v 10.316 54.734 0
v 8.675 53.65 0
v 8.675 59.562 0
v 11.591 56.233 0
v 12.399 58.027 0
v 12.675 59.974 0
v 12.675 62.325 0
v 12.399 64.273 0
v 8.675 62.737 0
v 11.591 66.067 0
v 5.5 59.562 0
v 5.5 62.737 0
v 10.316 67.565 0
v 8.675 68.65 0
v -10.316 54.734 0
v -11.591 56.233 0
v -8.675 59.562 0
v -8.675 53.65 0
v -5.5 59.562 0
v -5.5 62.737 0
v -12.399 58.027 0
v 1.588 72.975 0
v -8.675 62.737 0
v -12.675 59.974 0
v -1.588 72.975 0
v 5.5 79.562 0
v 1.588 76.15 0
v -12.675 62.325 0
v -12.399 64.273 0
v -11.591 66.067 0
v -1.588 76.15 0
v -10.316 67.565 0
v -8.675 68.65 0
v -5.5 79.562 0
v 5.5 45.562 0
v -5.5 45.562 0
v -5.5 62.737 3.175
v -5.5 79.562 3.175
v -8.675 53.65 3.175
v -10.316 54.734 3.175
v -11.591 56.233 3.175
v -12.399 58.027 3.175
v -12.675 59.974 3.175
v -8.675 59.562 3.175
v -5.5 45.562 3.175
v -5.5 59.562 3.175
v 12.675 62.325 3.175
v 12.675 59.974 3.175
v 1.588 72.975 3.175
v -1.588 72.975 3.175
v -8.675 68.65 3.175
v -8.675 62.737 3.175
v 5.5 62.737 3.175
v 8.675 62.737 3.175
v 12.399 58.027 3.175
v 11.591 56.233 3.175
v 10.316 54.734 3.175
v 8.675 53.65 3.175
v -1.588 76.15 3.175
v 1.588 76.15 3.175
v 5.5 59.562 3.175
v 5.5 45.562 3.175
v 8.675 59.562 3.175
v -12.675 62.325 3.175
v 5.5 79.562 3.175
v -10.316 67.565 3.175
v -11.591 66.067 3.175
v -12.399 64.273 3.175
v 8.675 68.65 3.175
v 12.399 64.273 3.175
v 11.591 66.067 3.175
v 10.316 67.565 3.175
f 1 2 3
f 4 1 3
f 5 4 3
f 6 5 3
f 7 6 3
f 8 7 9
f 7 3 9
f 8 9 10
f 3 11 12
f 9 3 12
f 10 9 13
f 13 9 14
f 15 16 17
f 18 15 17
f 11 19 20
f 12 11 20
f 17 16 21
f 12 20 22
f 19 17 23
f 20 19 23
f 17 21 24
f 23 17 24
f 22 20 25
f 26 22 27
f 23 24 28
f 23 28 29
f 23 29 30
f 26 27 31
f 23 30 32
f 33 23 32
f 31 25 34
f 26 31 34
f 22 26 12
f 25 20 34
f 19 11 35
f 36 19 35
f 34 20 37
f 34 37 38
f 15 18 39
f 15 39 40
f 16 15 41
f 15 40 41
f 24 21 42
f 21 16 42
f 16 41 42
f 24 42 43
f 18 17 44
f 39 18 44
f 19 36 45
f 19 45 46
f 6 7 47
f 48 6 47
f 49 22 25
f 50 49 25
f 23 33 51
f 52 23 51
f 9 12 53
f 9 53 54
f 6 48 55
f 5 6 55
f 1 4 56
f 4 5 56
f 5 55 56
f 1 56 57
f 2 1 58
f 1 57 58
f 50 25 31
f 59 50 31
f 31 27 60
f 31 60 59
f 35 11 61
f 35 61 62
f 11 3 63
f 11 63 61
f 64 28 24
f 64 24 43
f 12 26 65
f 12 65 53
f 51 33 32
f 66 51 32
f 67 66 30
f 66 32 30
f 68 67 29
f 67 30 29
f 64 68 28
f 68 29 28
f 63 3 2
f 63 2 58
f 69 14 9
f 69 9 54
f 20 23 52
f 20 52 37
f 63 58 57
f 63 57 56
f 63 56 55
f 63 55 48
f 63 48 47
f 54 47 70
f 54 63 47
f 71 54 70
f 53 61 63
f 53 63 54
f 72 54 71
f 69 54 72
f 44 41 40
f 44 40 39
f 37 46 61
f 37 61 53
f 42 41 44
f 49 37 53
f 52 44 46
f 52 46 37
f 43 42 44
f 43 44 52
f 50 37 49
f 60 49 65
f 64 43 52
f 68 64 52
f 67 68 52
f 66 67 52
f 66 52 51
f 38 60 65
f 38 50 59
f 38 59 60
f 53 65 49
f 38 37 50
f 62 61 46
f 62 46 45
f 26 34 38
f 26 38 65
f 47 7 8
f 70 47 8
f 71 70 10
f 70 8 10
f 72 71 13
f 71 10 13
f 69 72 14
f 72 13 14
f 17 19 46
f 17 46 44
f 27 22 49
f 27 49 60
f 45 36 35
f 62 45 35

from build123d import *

# Parameters (mm, degrees)
BOSS_EXTRUDE1_DEPTH = 3.175
SKETCH2_W           = 3.175
SKETCH2_H           = 3.175
CUT_EXTRUDE1_DEPTH  = 81.096853282
SKETCH3_W           = 3.175
SKETCH3_H           = 15
BOSS_EXTRUDE2_DEPTH = 4
FILLET1_R           = 7


with BuildPart() as part:
    # Sketch1 → Boss-Extrude1 (new body)
    with BuildSketch(Plane.XY):
        Polygon((3, 45.562363311), (-3, 45.562363311), (-5.5, 45.562363311), (-5.5, 59.562363311), (-8.675, 59.562363311), (-8.675, 62.737363311), (-5.5, 62.737363311), (-5.5, 79.562363311), (5.5, 79.562363311), (5.5, 62.737363311), (8.675, 62.737363311), (8.675, 59.562363311), (5.5, 59.562363311), (5.5, 45.562363311), align=None)
    extrude(amount=BOSS_EXTRUDE1_DEPTH)

    # Sketch2 → Cut-Extrude1 (cut, through all)
    with BuildSketch(Plane(origin=(0, 0, 0), x_dir=(-1, 0, 0), z_dir=(0, 0, -1))):
        with Locations((0, 74.562363311)):
            Rectangle(SKETCH2_W, SKETCH2_H)
    extrude(amount=-CUT_EXTRUDE1_DEPTH, mode=Mode.SUBTRACT)

    # Sketch3 → Boss-Extrude2 (add)
    with BuildSketch(Plane.ZY.offset(8.675)):
        with Locations((1.5875, 61.149863311)):
            Rectangle(SKETCH3_W, SKETCH3_H)
    boss_extrude2 = extrude(amount=BOSS_EXTRUDE2_DEPTH)

    # Mirror2: Boss-Extrude2 across plane
    add(boss_extrude2.mirror(Plane(origin=(0, 0, 0), x_dir=(0, 0, 1), z_dir=(1, 0, 0))))

    # Fillet1
    # the kernel refuses this fillet: 7 mm, written as the material it takes off along each edge
    with BuildSketch(Plane(origin=(-12.675, 68.649863311, -15.811388301), x_dir=(1, 0, 0), z_dir=(0, 0, 1))) as fillet1_piece_1:
        with BuildLine():
            CenterArc((7, -6.32455532), FILLET1_R, 115.376933525, 64.623066475)
            Line((0, -6.32455532), (-0.14, -6.32455532))
            Line((-0.14, -6.32455532), (-0.14, 0))
            Line((-0.14, 0), (0, 0.14))
            ThreePointArc((0, 0.14), (2, 0.14), (3.94, 0.126491106))
            Line((3.94, 0.126491106), (4, 0))
        make_face()
    extrude(amount=34.797776602, mode=Mode.SUBTRACT)
    with BuildSketch(Plane(origin=(-12.675, 53.649863311, 18.986388301), x_dir=(0, 1, 0), z_dir=(0, 0, -1))) as fillet1_piece_2:
        with BuildLine():
            CenterArc((6.32455532, 7), FILLET1_R, 205.376933525, 64.623066475)
            Line((0, 4), (-0.126491106, 3.94))
            ThreePointArc((-0.126491106, 3.94), (-0.14, 2), (-0.14, 0))
            Line((-0.14, 0), (0, -0.14))
            Line((0, -0.14), (6.32455532, -0.14))
            Line((6.32455532, -0.14), (6.32455532, 0))
        make_face()
    extrude(amount=34.797776602, mode=Mode.SUBTRACT)
    with BuildSketch(Plane(origin=(12.675, 68.649863311, -15.811388301), x_dir=(0, -1, 0), z_dir=(0, 0, 1))) as fillet1_piece_3:
        with BuildLine():
            CenterArc((6.32455532, -7), FILLET1_R, 90, 64.623066475)
            Line((0, -4), (-0.126491106, -3.94))
            ThreePointArc((-0.126491106, -3.94), (-0.14, -2), (-0.14, 0))
            Line((-0.14, 0), (0, 0.14))
            Line((0, 0.14), (6.32455532, 0.14))
            Line((6.32455532, 0.14), (6.32455532, 0))
        make_face()
    extrude(amount=34.797776602, mode=Mode.SUBTRACT)
    with BuildSketch(Plane(origin=(12.675, 53.649863311, 18.986388301), x_dir=(-1, 0, 0), z_dir=(0, 0, -1))) as fillet1_piece_4:
        with BuildLine():
            CenterArc((7, 6.32455532), FILLET1_R, 180, 64.623066475)
            Line((0, 6.32455532), (-0.14, 6.32455532))
            Line((-0.14, 6.32455532), (-0.14, 0))
            Line((-0.14, 0), (0, -0.14))
            ThreePointArc((0, -0.14), (2, -0.14), (3.94, -0.126491106))
            Line((3.94, -0.126491106), (4, 0))
        make_face()
    extrude(amount=34.797776602, mode=Mode.SUBTRACT)


solid = part.part
